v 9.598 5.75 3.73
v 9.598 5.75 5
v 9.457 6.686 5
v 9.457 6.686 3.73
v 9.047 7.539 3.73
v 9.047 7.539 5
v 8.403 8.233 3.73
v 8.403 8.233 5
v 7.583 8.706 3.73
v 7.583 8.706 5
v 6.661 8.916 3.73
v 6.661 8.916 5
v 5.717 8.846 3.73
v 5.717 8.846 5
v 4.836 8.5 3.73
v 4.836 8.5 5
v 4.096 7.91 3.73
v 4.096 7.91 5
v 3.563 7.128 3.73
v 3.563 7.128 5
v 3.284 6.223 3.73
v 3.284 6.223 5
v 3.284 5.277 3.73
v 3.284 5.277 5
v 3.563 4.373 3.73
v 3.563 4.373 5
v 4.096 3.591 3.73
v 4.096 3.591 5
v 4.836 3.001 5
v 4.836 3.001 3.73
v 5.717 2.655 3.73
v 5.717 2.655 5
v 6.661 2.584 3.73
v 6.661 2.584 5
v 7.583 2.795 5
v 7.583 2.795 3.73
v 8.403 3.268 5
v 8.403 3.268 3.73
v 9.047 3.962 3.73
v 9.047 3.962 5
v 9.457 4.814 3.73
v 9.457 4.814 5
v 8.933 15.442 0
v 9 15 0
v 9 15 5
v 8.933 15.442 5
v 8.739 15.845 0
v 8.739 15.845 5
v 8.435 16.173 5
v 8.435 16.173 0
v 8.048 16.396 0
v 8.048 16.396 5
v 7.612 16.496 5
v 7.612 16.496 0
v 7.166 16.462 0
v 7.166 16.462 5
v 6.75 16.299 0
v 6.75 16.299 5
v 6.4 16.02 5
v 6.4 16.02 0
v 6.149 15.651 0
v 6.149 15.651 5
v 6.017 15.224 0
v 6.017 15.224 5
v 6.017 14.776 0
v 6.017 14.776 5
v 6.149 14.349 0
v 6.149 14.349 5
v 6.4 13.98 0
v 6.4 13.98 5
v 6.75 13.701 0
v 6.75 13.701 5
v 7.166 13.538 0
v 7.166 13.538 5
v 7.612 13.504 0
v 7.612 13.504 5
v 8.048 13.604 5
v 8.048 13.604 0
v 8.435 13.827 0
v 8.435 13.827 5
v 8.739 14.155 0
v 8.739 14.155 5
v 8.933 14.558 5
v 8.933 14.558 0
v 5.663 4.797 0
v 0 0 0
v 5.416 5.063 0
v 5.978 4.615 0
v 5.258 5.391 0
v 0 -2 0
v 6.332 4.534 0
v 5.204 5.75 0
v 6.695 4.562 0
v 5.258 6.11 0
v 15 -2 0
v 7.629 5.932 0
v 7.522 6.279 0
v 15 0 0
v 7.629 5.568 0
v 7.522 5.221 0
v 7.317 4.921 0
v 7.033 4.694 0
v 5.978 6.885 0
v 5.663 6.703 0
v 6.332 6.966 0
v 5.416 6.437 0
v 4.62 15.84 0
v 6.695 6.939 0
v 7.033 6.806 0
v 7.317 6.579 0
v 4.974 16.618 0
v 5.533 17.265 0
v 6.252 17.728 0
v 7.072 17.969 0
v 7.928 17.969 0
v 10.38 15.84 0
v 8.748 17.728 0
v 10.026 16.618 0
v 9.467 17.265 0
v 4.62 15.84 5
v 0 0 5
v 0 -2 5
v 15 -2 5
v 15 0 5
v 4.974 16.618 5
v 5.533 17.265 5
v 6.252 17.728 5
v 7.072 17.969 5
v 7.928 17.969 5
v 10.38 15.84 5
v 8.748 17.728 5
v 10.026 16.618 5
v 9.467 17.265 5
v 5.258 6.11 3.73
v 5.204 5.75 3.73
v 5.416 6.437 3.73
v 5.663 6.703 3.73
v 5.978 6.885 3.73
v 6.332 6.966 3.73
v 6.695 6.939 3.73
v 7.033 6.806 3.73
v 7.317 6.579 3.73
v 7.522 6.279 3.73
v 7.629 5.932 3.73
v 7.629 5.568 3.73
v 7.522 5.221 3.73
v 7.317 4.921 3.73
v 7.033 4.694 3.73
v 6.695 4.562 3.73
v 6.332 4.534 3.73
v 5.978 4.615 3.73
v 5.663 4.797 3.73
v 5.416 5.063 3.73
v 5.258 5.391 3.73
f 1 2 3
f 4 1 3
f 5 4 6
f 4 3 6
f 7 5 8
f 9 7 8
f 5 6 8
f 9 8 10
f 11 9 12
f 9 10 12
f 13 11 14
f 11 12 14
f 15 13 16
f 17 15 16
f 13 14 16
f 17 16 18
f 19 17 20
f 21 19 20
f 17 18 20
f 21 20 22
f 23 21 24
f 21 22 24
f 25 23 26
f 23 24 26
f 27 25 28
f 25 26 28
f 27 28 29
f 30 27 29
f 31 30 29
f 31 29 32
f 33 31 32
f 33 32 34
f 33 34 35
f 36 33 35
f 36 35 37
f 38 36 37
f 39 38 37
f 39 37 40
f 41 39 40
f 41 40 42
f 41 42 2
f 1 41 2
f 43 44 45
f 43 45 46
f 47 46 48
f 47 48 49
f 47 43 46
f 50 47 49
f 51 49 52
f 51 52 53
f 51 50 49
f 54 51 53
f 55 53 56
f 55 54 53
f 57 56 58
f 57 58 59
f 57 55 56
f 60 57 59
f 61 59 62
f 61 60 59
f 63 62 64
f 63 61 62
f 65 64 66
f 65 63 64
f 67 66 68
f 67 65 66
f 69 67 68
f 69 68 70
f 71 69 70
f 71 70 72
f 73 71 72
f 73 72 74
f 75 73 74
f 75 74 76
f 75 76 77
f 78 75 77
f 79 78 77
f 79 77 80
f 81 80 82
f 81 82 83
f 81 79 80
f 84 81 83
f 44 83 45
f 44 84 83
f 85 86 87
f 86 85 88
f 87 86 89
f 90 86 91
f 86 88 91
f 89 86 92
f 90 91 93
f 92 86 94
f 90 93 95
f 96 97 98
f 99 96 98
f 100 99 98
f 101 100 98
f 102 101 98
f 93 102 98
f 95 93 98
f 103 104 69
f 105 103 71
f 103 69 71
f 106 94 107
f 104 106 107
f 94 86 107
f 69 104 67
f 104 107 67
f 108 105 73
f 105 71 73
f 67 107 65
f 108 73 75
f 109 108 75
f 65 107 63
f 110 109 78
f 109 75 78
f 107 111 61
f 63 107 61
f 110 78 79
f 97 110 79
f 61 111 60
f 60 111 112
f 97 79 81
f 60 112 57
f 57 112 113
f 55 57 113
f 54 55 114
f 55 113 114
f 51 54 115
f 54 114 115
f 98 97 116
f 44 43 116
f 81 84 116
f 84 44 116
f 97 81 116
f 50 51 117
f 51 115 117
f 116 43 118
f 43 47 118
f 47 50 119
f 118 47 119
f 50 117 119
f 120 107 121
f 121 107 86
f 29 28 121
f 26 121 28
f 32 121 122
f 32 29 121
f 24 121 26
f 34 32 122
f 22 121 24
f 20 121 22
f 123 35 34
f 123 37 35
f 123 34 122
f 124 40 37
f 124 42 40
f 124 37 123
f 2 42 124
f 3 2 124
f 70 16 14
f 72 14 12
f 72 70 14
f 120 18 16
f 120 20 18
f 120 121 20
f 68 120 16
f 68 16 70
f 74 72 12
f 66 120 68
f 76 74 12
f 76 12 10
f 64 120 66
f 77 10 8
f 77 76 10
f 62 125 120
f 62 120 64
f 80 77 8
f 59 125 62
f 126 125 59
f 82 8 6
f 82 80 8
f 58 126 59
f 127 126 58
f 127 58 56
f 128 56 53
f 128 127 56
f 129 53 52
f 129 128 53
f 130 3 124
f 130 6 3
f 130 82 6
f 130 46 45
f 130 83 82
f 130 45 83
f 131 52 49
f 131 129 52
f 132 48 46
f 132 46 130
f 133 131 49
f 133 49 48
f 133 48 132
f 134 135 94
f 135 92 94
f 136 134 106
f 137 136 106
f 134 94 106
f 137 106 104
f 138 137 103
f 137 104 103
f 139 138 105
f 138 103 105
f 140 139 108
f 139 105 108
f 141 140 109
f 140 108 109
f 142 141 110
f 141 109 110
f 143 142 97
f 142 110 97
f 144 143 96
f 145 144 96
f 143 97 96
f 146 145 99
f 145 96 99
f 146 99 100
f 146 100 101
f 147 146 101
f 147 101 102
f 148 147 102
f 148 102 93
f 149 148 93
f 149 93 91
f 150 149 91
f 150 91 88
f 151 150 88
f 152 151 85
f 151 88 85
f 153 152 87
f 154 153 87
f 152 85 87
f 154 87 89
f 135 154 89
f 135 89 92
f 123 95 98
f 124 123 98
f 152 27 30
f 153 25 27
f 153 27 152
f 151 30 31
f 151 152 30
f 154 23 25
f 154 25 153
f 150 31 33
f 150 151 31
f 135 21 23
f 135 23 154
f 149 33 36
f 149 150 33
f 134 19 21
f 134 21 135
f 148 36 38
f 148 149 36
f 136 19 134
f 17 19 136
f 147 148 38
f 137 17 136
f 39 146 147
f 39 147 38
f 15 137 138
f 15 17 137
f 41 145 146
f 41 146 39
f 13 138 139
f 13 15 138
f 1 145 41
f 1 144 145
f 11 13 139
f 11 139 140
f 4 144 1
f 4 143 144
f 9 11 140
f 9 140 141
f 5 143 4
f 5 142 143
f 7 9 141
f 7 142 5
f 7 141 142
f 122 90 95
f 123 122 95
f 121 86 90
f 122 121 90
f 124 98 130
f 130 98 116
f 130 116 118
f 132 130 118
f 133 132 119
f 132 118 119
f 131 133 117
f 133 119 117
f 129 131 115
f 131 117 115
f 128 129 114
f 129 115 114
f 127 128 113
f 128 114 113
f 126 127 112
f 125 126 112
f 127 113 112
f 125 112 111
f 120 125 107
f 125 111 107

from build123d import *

# Parameters (mm, degrees)
SKETCH1_R                                  = 1.5
BOSS_EXTRUDE1_DEPTH                        = 5
CBORE_FOR_2_HEX_MACHINE_SCREW1_D           = 2.4384
CBORE_FOR_2_HEX_MACHINE_SCREW1_CBORE_D     = 6.35
CBORE_FOR_2_HEX_MACHINE_SCREW1_CBORE_DEPTH = 1.27


with BuildPart() as part:
    # Sketch1 → Boss-Extrude1 (new body)
    with BuildSketch(Plane.XY):
        with BuildLine():
            Line((15, 0), (10.38, 15.84))
            ThreePointArc((10.38, 15.84), (7.5, 18), (4.62, 15.84))
            Line((4.62, 15.84), (0, 0))
            Line((0, 0), (0, -2))
            Line((0, -2), (15, -2))
            Line((15, -2), (15, 0))
        make_face()
        with Locations((7.5, 15)):
            Circle(SKETCH1_R, mode=Mode.SUBTRACT)
    extrude(amount=BOSS_EXTRUDE1_DEPTH)

    # CBORE for #2 Hex Machine Screw1 (through all)
    with Locations(Plane.XY.offset(5)):
        with Locations((6.423403237, 5.750188816)):
            CounterBoreHole(CBORE_FOR_2_HEX_MACHINE_SCREW1_D / 2, CBORE_FOR_2_HEX_MACHINE_SCREW1_CBORE_D / 2, CBORE_FOR_2_HEX_MACHINE_SCREW1_CBORE_DEPTH)


solid = part.part
